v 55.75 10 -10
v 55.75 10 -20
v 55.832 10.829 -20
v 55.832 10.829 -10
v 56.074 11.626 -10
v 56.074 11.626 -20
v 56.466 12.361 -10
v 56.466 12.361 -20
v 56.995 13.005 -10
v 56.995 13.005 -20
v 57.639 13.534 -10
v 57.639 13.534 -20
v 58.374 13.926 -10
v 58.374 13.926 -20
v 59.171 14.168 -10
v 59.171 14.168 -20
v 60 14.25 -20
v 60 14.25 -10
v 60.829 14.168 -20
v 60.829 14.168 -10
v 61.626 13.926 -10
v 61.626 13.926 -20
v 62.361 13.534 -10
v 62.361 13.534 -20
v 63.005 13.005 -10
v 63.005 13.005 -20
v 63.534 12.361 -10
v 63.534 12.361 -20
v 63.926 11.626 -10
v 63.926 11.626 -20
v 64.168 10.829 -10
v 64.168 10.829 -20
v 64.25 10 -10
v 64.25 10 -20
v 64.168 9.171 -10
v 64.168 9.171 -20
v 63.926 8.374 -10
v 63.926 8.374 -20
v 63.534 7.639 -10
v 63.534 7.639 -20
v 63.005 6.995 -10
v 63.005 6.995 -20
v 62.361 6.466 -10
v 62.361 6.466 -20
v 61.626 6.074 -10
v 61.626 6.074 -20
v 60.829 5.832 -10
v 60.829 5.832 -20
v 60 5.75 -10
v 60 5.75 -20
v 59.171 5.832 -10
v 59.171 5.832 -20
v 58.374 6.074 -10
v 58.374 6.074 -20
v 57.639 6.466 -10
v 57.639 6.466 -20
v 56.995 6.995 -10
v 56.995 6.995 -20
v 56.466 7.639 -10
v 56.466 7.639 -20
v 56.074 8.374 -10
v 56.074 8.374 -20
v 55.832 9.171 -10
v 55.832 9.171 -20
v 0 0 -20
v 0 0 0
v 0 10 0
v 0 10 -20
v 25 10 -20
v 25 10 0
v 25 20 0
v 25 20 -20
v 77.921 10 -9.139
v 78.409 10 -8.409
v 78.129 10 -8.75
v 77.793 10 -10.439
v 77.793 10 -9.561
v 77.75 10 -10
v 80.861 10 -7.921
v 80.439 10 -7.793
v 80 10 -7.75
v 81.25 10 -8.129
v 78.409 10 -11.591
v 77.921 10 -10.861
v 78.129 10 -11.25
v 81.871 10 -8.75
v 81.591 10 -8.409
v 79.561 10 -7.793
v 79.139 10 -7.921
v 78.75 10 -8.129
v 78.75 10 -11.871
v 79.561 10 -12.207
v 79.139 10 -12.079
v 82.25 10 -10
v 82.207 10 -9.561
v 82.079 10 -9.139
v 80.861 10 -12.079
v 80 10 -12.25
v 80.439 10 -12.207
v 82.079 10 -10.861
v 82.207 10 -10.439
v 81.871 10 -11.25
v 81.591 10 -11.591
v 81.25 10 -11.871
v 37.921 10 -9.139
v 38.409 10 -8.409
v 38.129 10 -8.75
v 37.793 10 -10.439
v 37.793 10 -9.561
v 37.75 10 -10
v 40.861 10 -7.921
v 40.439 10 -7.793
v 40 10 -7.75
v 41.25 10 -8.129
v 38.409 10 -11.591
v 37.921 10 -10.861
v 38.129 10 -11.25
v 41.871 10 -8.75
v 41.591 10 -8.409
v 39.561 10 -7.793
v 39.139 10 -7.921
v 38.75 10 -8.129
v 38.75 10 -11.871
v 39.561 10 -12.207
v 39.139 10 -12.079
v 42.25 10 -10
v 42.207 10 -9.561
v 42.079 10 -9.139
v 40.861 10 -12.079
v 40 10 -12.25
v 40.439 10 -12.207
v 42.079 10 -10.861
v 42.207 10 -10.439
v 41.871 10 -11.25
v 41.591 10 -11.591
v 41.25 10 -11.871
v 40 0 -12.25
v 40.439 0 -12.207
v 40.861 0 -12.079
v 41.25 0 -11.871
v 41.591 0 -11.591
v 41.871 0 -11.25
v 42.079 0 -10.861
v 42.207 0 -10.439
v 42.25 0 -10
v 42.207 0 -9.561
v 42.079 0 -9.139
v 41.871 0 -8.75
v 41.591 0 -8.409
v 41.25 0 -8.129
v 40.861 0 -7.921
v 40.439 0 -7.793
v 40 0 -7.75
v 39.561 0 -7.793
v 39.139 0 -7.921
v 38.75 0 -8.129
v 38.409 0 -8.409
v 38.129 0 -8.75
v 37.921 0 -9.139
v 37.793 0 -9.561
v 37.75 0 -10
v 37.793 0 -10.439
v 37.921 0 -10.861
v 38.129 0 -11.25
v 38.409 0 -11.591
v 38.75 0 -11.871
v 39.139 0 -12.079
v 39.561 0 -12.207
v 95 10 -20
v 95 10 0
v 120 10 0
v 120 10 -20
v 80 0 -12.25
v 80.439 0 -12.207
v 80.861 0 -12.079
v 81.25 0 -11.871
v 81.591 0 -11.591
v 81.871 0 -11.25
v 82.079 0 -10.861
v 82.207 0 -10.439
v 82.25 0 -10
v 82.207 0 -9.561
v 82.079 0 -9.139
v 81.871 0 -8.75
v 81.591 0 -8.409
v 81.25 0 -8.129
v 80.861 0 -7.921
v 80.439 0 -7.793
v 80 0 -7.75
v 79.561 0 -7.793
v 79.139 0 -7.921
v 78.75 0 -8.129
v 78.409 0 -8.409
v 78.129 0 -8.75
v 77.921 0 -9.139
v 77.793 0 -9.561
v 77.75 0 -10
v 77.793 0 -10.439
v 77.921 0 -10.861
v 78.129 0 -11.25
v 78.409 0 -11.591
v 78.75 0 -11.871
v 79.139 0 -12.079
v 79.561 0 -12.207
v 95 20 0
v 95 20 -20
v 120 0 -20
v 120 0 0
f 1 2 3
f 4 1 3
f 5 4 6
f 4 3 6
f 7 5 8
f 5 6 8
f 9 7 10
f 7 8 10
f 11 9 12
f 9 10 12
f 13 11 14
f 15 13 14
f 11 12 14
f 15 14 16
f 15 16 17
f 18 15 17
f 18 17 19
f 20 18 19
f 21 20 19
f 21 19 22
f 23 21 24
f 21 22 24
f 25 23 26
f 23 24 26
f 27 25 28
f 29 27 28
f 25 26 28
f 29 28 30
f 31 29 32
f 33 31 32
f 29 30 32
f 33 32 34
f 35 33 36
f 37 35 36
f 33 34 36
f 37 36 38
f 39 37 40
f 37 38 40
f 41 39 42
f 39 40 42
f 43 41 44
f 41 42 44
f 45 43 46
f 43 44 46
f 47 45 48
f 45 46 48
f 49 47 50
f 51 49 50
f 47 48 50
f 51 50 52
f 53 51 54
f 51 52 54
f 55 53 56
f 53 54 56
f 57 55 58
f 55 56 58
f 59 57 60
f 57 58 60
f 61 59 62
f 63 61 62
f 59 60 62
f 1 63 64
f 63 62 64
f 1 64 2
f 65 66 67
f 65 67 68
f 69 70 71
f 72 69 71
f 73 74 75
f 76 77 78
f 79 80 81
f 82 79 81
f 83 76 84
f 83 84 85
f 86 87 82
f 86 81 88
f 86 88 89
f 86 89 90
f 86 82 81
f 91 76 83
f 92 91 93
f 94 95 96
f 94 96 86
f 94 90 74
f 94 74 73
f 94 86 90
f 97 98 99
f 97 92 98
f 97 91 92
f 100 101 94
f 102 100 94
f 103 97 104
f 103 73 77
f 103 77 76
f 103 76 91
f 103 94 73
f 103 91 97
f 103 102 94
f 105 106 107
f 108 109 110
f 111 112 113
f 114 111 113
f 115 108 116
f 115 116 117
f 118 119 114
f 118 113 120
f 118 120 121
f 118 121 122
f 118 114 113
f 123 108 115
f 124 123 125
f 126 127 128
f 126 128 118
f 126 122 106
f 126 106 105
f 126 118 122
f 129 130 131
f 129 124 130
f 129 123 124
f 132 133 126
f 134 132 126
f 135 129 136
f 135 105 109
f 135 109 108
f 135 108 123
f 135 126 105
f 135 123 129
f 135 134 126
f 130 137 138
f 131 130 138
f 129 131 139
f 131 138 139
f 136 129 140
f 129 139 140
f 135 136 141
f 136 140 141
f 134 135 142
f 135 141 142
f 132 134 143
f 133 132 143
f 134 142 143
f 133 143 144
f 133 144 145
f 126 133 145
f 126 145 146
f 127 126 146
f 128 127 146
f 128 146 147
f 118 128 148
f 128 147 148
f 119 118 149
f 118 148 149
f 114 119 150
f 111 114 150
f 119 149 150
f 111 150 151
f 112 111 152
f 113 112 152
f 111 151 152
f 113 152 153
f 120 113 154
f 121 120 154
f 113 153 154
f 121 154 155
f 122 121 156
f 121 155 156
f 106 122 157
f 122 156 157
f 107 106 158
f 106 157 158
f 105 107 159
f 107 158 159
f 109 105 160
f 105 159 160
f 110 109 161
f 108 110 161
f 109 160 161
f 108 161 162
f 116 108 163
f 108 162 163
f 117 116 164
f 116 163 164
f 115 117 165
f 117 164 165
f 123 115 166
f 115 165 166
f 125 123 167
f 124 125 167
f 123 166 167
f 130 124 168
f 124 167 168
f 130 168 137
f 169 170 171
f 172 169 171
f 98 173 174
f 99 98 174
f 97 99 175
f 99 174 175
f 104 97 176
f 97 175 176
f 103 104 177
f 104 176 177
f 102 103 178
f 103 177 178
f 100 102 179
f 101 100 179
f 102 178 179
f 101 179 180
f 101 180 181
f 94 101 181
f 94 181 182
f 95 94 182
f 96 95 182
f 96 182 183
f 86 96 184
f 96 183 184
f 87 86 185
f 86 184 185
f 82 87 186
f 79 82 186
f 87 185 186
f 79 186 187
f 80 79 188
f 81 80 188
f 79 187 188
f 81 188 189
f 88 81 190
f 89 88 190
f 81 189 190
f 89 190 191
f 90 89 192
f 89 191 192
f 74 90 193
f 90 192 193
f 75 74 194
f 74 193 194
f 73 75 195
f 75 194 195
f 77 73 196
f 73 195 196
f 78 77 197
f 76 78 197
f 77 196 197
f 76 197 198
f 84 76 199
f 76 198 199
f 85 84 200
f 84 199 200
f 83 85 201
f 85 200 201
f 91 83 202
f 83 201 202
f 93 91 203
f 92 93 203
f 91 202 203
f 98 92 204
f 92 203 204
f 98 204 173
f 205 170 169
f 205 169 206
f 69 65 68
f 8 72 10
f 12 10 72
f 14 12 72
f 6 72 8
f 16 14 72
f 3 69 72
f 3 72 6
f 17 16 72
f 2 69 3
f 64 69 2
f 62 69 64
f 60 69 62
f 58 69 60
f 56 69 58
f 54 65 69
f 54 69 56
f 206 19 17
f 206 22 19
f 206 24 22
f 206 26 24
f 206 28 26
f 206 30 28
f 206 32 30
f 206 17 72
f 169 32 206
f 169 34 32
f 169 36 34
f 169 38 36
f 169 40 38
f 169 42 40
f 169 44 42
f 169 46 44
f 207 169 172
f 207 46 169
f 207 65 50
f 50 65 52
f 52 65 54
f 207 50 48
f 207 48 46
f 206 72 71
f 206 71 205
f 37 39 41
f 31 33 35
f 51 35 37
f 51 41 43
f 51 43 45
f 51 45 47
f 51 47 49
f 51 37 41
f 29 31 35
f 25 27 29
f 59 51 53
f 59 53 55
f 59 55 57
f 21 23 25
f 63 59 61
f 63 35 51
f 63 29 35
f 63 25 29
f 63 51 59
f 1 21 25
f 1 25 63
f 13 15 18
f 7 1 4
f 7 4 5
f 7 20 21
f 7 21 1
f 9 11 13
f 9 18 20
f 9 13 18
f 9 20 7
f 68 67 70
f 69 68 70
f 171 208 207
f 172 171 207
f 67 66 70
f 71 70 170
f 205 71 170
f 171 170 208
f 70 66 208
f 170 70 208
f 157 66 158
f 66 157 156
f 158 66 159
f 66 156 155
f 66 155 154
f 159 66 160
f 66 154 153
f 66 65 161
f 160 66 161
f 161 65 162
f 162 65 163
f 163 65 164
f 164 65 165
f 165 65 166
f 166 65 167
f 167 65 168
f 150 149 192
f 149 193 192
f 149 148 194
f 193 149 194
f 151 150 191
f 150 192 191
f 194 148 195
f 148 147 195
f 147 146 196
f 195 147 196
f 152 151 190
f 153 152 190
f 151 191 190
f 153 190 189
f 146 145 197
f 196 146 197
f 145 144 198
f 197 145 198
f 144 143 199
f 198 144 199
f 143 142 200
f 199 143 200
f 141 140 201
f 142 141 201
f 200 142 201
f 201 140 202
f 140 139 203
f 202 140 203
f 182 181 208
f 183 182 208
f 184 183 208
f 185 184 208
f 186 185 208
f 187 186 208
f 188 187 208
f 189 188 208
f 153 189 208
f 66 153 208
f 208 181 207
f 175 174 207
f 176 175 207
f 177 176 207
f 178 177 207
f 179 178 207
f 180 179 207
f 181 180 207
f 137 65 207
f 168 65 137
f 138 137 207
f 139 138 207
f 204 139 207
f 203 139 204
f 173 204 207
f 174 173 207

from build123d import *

# Parameters (mm, degrees)
SKETCH1_W           = 120
SKETCH1_H           = 20
BOSS_EXTRUDE1_DEPTH = 20
SKETCH2_W           = 25
SKETCH2_H           = 10
CUT_EXTRUDE1_DEPTH  = 20
SKETCH5_R           = 4.25
CUT_EXTRUDE3_DEPTH  = 10
SKETCH6_R           = 2.25
CUT_EXTRUDE4_DEPTH  = 10


with BuildPart() as part:
    # Sketch1 → Boss-Extrude1 (new body)
    with BuildSketch(Plane(origin=(0, 0, 0), x_dir=(1, 0, 0), z_dir=(0, 1, 0))):
        with Locations((60, 10)):
            Rectangle(SKETCH1_W, SKETCH1_H)
    extrude(amount=BOSS_EXTRUDE1_DEPTH)

    # Sketch2 → Cut-Extrude1 (cut)
    with BuildSketch(Plane.XY):
        with Locations((12.5, 15)):
            Rectangle(SKETCH2_W, SKETCH2_H)
        with Locations((107.5, 15)):
            Rectangle(SKETCH2_W, SKETCH2_H)
    extrude(amount=-CUT_EXTRUDE1_DEPTH, mode=Mode.SUBTRACT)

    # Sketch5 → Cut-Extrude3 (cut)
    with BuildSketch(Plane(origin=(0, 0, -20), x_dir=(-1, 0, 0), z_dir=(0, 0, -1))):
        with Locations((-60, 10)):
            Circle(SKETCH5_R)
    extrude(amount=-CUT_EXTRUDE3_DEPTH, mode=Mode.SUBTRACT)

    # Sketch6 → Cut-Extrude4 (cut)
    with BuildSketch(Plane(origin=(0, 0, 0), x_dir=(-1, 0, 0), z_dir=(0, -1, 0))):
        with Locations(Location((-80, 10, 0), (0, 0, 90))):
            Circle(SKETCH6_R)
        with Locations(Location((-40, 10, 0), (0, 0, 90))):
            Circle(SKETCH6_R)
    extrude(amount=-CUT_EXTRUDE4_DEPTH, mode=Mode.SUBTRACT)


solid = part.part
